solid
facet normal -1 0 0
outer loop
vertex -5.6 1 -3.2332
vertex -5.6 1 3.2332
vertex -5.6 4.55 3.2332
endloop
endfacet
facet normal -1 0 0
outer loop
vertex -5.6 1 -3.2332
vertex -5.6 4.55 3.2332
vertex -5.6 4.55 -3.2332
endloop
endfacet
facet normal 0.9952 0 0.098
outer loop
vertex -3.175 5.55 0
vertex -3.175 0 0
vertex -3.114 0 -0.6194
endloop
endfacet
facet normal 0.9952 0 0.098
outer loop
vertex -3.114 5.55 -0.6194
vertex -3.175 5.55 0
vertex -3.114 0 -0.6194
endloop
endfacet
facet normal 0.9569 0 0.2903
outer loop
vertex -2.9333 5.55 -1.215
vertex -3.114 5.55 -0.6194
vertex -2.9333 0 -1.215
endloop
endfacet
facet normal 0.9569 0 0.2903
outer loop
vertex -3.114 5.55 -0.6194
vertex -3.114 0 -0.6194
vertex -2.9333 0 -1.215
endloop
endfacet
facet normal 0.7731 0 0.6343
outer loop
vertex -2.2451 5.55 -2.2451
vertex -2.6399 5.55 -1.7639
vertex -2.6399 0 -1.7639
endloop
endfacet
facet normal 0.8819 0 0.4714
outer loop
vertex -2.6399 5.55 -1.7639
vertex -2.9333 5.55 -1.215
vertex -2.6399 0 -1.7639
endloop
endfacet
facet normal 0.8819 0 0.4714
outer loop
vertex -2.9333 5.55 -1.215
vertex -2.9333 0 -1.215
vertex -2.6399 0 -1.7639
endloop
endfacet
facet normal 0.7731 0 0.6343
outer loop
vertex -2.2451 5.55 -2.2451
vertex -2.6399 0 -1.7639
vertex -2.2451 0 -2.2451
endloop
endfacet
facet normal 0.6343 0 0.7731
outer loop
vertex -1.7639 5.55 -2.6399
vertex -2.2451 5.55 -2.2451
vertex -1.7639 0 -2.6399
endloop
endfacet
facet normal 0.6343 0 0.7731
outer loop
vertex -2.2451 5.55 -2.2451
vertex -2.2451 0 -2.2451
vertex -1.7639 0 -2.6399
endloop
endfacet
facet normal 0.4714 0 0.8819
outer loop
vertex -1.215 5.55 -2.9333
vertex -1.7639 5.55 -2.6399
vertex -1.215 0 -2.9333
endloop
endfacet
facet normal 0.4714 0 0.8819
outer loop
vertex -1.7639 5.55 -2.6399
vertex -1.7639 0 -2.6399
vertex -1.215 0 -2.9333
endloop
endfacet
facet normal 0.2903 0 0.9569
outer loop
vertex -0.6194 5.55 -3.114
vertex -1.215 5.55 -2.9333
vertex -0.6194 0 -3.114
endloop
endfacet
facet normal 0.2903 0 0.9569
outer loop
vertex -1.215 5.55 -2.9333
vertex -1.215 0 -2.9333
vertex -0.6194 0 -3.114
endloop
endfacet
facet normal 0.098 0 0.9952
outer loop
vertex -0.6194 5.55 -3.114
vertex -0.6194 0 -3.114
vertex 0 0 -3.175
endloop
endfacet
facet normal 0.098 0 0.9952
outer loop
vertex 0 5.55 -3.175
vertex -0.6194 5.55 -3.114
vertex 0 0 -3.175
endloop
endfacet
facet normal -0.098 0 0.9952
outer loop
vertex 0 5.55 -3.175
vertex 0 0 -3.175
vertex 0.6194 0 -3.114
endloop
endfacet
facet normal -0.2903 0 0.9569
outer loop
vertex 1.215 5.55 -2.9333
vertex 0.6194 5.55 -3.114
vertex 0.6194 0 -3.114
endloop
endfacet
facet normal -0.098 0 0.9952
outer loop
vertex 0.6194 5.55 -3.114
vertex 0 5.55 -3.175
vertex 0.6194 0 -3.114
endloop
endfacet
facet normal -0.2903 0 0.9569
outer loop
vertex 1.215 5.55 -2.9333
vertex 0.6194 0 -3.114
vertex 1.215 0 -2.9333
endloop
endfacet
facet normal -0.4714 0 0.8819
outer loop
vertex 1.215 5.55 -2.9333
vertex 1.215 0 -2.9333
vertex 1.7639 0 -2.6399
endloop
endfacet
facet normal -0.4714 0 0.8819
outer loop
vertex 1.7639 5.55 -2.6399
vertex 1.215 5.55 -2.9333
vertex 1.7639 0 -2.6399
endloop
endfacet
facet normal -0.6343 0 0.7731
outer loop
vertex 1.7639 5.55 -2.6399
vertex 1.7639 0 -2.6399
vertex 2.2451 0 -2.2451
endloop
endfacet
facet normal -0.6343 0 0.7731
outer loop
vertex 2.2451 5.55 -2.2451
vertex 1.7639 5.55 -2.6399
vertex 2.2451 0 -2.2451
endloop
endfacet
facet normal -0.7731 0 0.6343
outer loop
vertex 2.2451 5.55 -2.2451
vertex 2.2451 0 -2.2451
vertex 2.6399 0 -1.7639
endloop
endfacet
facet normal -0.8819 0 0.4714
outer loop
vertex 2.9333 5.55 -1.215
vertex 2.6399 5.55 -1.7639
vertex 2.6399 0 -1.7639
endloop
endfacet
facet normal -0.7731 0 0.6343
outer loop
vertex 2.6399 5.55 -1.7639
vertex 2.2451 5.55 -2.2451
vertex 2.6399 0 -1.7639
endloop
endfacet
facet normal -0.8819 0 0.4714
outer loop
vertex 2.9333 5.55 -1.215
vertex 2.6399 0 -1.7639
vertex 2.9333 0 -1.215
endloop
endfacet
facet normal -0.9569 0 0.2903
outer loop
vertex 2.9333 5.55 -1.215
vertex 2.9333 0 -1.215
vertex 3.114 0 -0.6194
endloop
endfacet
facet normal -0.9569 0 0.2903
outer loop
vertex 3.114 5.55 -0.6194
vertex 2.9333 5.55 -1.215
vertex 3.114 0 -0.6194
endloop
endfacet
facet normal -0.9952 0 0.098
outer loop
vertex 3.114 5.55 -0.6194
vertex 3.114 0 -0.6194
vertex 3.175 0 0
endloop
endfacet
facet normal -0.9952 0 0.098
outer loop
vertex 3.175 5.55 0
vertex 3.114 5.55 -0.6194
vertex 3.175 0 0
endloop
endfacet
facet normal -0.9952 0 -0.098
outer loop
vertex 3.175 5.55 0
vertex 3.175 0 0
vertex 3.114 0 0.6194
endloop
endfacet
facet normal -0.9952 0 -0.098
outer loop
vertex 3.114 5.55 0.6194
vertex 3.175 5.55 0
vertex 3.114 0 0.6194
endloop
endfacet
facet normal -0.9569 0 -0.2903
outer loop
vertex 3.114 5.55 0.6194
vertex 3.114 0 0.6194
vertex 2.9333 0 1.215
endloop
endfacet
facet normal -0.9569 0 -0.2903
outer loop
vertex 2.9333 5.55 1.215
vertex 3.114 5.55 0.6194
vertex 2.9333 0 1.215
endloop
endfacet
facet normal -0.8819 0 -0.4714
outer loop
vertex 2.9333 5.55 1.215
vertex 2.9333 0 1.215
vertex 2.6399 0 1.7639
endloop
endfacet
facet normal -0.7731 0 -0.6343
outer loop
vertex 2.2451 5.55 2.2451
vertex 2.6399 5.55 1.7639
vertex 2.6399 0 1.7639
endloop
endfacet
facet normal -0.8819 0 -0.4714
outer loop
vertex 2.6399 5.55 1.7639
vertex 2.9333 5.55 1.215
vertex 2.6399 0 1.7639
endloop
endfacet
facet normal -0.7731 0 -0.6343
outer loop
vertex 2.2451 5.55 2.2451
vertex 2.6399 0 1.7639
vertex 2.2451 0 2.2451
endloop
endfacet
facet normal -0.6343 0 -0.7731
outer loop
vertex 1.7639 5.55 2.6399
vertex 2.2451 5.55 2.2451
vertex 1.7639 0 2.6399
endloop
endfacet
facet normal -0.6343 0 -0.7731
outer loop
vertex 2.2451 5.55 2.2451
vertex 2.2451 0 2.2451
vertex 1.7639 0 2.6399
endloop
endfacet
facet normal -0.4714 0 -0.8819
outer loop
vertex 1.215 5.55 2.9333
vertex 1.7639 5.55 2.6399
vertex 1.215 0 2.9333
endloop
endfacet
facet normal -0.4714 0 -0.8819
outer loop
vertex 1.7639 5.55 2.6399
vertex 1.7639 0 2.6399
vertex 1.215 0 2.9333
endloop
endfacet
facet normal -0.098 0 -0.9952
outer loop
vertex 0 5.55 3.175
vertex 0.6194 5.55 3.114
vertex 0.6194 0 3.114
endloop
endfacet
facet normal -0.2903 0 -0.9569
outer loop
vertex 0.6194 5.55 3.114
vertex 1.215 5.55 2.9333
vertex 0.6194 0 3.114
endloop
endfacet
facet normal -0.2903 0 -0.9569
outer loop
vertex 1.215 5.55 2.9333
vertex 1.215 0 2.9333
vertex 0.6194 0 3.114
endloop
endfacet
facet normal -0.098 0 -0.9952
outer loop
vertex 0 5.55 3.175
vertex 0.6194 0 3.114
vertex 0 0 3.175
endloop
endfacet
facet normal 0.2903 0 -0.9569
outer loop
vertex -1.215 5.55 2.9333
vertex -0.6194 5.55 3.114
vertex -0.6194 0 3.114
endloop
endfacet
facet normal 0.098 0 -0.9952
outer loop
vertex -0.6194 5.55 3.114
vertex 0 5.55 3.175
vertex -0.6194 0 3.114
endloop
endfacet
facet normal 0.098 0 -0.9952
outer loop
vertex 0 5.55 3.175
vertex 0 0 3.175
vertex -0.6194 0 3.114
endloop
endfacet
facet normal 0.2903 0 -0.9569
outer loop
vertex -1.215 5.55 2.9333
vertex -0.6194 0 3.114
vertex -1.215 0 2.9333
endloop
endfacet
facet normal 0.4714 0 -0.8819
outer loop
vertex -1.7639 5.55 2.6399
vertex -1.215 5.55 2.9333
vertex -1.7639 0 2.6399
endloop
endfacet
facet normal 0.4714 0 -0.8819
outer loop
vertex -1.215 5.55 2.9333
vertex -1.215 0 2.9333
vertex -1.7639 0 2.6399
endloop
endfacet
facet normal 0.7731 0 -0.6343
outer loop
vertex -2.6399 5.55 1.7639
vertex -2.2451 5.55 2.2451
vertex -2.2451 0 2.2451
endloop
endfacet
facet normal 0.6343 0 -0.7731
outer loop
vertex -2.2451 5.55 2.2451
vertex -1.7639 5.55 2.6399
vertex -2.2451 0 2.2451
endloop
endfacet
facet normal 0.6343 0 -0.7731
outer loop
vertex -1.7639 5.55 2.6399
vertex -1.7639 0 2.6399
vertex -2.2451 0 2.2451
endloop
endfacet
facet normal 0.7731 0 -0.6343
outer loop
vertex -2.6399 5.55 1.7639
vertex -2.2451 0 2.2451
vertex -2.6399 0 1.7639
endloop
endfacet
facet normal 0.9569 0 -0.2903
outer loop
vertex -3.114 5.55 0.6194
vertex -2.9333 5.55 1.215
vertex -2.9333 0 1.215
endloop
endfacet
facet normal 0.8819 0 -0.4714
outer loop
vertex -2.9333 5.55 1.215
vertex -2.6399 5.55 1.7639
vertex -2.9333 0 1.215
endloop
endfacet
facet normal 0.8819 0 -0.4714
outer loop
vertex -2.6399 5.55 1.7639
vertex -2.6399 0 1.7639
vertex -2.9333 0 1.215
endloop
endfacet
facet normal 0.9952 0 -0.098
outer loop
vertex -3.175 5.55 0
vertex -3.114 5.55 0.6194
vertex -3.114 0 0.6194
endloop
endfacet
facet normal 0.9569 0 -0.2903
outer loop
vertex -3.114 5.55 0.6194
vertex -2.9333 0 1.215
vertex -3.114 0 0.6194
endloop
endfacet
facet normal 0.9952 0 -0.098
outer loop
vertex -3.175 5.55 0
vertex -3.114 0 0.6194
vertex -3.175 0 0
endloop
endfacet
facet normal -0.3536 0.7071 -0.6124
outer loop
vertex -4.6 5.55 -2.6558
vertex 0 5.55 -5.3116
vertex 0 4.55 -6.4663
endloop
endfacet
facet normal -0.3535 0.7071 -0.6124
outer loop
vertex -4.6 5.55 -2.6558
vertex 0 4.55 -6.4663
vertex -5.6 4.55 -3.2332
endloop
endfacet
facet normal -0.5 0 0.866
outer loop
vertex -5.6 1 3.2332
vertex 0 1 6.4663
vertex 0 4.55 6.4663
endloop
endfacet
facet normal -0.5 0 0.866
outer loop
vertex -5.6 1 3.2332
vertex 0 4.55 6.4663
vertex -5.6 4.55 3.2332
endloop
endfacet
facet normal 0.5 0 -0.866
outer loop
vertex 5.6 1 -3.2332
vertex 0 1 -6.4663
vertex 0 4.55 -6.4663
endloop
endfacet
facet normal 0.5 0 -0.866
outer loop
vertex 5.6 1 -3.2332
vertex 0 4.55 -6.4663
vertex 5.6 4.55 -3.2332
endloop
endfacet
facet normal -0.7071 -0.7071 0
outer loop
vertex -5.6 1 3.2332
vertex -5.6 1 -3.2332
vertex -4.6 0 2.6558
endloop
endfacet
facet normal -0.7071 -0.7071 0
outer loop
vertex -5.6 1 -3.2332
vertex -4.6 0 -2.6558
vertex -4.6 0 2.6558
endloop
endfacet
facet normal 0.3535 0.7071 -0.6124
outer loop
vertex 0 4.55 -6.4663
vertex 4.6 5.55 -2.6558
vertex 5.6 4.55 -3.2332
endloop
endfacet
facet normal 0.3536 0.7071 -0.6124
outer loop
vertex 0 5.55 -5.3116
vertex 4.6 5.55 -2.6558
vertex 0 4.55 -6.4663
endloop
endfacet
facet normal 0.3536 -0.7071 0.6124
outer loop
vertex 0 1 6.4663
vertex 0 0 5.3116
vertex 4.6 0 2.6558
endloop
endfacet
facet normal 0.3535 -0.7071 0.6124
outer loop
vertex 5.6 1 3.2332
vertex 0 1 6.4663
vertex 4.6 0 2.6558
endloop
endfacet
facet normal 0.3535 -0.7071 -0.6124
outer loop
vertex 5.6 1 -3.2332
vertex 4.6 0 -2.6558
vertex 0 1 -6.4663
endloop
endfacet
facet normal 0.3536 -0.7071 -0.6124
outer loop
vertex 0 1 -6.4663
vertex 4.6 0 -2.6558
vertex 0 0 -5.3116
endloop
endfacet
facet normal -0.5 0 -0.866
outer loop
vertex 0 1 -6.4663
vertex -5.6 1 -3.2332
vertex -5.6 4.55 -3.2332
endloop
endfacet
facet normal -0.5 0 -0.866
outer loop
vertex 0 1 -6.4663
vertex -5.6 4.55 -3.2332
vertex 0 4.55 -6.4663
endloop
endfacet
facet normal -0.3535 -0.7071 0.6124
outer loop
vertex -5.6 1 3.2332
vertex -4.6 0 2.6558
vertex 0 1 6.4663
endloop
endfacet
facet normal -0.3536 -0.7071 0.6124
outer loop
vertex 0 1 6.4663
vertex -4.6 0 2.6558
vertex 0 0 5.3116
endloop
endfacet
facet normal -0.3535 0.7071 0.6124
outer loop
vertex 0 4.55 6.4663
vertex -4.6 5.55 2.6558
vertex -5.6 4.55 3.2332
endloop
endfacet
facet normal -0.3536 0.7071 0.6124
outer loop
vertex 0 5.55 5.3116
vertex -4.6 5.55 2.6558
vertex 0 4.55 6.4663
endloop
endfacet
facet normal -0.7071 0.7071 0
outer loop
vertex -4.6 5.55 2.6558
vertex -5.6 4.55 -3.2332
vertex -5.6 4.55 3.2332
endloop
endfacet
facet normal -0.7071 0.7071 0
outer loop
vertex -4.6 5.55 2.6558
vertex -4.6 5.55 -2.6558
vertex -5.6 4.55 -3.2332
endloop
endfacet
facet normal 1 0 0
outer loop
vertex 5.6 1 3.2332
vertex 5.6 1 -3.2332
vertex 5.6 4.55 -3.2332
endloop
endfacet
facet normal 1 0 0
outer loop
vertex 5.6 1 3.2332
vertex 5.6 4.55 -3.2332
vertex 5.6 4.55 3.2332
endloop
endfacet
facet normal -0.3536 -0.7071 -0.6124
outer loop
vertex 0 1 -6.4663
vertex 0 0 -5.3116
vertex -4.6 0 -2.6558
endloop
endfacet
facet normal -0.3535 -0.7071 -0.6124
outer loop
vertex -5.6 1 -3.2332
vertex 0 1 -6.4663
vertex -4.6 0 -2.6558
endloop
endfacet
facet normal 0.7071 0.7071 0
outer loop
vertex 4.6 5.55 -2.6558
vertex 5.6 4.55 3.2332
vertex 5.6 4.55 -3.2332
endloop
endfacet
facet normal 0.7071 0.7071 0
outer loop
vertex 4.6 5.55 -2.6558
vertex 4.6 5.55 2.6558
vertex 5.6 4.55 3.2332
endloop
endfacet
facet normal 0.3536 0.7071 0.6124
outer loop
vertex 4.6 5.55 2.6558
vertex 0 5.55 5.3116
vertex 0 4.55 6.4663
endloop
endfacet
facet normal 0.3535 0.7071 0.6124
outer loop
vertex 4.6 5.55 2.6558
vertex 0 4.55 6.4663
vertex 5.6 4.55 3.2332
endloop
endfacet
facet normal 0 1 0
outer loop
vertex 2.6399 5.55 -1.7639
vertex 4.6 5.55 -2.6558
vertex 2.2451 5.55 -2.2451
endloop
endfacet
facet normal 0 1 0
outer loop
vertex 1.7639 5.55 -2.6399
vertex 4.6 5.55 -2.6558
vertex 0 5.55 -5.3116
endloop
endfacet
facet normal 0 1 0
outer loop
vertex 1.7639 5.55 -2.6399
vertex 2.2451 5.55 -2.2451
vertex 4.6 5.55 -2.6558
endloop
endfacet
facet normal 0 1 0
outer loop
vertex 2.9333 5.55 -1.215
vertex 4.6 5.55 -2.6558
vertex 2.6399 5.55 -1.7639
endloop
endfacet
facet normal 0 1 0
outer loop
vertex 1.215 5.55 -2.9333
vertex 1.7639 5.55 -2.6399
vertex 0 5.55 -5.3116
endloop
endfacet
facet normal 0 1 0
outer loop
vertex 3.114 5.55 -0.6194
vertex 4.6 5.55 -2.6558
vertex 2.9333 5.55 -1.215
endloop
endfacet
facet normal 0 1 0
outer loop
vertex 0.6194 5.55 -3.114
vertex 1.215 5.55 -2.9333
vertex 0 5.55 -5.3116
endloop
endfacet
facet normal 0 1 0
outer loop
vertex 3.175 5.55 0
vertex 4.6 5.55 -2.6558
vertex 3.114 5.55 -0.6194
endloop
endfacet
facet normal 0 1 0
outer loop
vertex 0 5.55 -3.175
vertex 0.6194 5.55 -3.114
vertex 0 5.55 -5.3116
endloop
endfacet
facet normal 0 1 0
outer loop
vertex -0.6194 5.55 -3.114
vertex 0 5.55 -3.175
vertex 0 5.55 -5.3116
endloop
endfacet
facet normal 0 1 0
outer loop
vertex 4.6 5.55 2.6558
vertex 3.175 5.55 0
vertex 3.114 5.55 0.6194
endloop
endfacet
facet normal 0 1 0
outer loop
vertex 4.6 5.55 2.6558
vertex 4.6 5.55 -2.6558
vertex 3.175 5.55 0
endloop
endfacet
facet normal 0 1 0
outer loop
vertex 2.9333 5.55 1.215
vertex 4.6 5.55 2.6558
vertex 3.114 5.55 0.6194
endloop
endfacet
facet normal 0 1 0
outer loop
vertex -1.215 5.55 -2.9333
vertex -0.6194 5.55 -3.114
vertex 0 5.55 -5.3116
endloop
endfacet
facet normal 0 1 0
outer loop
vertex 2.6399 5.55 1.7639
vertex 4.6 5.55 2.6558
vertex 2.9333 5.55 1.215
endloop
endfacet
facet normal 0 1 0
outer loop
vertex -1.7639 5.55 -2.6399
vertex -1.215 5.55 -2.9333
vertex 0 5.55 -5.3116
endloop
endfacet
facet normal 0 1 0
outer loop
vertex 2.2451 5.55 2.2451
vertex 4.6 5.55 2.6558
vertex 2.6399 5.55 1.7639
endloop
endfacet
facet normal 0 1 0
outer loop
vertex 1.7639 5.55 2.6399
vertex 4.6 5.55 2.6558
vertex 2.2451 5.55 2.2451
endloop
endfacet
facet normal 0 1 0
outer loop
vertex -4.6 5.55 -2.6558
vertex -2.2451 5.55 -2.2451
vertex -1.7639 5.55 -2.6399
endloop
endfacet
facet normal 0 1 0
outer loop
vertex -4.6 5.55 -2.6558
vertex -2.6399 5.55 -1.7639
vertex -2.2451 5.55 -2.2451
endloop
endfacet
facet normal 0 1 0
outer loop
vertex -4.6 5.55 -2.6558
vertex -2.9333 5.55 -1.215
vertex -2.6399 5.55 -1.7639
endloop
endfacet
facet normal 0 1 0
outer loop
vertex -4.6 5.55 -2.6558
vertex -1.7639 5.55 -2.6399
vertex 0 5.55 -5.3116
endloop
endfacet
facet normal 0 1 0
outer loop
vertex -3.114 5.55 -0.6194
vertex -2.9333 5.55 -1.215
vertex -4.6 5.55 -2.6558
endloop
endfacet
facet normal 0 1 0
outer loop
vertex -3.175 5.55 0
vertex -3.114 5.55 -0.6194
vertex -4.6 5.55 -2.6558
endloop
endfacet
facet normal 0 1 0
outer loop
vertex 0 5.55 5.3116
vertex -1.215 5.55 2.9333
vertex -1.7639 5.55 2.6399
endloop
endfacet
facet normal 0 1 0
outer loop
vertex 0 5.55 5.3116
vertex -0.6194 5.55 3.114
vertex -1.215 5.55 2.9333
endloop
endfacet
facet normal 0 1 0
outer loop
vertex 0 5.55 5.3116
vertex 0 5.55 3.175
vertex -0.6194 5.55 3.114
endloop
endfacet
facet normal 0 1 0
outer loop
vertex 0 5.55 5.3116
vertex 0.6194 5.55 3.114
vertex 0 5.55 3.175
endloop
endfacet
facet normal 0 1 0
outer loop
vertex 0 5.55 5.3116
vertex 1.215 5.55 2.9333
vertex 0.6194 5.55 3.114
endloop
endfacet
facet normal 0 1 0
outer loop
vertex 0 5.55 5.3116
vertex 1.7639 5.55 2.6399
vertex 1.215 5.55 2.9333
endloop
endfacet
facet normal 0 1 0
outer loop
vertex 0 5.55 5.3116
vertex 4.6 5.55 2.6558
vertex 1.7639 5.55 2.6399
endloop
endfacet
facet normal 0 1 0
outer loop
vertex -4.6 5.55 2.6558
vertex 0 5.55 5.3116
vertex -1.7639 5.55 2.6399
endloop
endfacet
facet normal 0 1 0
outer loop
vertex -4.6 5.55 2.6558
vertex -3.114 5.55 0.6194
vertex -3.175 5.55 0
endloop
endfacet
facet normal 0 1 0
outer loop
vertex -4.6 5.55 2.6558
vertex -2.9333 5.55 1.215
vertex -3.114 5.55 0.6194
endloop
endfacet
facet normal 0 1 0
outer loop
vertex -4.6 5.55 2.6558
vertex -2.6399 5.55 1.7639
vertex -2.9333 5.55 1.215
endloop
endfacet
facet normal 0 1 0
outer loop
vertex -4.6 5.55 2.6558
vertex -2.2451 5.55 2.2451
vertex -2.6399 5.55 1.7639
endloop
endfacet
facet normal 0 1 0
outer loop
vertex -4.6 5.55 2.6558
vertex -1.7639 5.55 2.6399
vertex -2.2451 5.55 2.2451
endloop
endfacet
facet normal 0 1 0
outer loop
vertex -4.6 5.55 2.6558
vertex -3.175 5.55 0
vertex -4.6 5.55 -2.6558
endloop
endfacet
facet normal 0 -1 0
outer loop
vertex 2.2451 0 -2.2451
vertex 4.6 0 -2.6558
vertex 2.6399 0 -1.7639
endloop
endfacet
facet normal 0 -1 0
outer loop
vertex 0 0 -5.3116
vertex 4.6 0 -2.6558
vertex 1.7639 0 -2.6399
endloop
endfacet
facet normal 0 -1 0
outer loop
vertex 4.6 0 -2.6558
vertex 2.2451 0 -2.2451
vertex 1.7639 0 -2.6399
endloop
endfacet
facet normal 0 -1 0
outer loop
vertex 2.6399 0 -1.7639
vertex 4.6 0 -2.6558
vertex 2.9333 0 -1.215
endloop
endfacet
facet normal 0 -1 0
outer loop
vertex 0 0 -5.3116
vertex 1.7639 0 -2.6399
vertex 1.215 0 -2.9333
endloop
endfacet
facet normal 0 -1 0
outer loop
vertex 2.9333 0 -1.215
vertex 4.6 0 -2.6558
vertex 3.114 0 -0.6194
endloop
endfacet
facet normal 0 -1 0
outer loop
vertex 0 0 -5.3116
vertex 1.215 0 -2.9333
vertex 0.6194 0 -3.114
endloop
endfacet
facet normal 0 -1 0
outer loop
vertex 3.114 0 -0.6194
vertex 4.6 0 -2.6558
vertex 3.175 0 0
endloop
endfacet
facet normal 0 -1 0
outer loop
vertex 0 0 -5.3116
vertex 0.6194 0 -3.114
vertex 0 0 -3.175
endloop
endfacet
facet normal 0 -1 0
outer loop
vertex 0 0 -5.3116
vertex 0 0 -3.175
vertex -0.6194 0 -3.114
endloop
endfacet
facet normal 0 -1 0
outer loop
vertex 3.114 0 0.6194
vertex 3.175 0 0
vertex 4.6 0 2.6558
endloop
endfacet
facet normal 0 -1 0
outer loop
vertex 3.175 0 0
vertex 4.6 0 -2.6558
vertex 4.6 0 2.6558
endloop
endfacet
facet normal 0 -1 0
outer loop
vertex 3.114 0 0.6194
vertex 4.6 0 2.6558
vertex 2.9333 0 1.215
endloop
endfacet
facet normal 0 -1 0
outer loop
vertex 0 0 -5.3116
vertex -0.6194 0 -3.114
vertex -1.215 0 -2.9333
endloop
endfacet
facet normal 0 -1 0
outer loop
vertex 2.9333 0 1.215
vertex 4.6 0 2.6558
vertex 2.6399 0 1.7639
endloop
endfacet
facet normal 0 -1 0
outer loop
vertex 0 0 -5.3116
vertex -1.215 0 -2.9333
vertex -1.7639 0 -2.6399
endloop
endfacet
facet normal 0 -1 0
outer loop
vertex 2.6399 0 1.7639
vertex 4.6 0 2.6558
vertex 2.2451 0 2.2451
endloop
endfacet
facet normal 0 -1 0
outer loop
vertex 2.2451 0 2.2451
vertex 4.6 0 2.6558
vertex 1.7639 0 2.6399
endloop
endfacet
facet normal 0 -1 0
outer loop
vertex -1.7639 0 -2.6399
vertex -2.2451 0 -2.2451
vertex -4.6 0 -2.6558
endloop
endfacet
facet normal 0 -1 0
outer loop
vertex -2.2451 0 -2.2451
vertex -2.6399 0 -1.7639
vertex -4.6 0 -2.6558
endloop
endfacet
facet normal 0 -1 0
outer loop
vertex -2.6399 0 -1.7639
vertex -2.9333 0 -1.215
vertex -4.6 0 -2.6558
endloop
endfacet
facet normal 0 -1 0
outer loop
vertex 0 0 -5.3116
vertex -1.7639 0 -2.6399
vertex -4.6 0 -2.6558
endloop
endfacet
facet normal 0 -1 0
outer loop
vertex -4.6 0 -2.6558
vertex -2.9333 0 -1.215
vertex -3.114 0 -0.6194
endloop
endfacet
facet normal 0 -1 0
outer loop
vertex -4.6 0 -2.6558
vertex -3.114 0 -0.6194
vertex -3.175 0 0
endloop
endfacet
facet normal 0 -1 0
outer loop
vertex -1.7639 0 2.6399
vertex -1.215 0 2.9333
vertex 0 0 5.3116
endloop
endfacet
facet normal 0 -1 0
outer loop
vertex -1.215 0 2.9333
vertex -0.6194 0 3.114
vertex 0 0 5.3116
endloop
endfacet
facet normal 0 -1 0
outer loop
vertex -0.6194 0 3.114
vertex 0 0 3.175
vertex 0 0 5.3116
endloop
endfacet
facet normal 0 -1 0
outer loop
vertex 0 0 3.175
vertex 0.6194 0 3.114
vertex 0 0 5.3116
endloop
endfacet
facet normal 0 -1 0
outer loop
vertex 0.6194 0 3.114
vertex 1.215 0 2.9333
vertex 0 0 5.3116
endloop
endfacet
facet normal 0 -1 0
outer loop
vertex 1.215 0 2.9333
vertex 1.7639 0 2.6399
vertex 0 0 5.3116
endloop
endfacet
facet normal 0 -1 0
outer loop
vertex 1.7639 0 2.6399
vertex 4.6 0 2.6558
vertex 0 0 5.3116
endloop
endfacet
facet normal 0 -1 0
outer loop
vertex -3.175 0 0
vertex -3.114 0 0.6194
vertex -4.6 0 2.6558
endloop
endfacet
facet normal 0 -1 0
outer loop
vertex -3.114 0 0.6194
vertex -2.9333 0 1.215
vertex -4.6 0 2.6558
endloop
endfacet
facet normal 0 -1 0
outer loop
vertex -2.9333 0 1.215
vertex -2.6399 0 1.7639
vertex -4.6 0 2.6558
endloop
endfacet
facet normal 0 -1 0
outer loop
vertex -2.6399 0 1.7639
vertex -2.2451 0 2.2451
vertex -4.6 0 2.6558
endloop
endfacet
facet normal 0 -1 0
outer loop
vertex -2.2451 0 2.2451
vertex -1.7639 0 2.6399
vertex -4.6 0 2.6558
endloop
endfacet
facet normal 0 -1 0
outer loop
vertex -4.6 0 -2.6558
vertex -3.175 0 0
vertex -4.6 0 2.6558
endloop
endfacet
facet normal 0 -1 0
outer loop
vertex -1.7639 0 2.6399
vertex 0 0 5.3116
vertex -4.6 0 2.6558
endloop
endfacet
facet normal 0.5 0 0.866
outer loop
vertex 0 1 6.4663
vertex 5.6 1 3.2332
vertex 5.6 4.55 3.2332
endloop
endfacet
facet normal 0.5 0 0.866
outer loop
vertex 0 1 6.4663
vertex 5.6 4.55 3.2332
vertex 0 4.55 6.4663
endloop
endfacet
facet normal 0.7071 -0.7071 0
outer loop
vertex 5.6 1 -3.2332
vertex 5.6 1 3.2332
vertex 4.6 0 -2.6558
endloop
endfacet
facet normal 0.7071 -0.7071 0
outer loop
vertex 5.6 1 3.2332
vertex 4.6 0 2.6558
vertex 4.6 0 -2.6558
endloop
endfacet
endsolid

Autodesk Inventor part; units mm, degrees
ref_plane "YZ Plane" through (0, 0, 0) normal (1, 0, 0) x (0, 1, 0)
ref_plane "XZ Plane" through (0, 0, 0) normal (0, 1, 0) x (-1, 0, 0)
ref_plane "XY Plane" through (0, 0, 0) normal (0, 0, 1) x (1, 0, 0)
sketch "Boceto1" plane through (0, 0, 0) normal (0, 1, 0) x (-1, 0, 0)
  line L0 (0, -6.4663) -> (-5.6, -3.2332)
  line L1 (-5.6, -3.2332) -> (-5.6, 3.2332)
  line L2 (-5.6, 3.2332) -> (0, 6.4663)
  line L3 (0, 6.4663) -> (5.6, 3.2332)
  line L4 (5.6, 3.2332) -> (5.6, -3.2332)
  line L5 (5.6, -3.2332) -> (0, -6.4663)
  circle A0 centre (0, 0) radius 3.175
  line L6 (11, 0) -> (-11, 0) construction
  point P0 (2.8, -4.8497)
  point P1 (1.5875, -2.7496)
  point P2 (5.6, 0)
  dimension "d0" = 6.35
  dimension "d2" = 1.5875
  dimension "d4" = 22
  dimension "d10" = 11.2
extrude "Extrusión1" add sketch "Boceto1" along normal blind 5.55
thread "Rosca1" size "M7x1" class "6H" standard "ANSI Metric M Profile" length 60
chamfer "Chaflán1" distance 1 angle 45 12 edges at (-2.8, 5.55, 4.8497) (2.8, 5.55, 4.8497) (5.6, 5.55, 0) (2.8, 5.55, -4.8497) (-2.8, 5.55, -4.8497) (-5.6, 5.55, 0) (-5.6, 0, 0) (-2.8, 0, -4.8497) (2.8, 0, -4.8497) (5.6, 0, 0) (2.8, 0, 4.8497) (-2.8, 0, 4.8497)
properties part number "Tuerca1-4"
